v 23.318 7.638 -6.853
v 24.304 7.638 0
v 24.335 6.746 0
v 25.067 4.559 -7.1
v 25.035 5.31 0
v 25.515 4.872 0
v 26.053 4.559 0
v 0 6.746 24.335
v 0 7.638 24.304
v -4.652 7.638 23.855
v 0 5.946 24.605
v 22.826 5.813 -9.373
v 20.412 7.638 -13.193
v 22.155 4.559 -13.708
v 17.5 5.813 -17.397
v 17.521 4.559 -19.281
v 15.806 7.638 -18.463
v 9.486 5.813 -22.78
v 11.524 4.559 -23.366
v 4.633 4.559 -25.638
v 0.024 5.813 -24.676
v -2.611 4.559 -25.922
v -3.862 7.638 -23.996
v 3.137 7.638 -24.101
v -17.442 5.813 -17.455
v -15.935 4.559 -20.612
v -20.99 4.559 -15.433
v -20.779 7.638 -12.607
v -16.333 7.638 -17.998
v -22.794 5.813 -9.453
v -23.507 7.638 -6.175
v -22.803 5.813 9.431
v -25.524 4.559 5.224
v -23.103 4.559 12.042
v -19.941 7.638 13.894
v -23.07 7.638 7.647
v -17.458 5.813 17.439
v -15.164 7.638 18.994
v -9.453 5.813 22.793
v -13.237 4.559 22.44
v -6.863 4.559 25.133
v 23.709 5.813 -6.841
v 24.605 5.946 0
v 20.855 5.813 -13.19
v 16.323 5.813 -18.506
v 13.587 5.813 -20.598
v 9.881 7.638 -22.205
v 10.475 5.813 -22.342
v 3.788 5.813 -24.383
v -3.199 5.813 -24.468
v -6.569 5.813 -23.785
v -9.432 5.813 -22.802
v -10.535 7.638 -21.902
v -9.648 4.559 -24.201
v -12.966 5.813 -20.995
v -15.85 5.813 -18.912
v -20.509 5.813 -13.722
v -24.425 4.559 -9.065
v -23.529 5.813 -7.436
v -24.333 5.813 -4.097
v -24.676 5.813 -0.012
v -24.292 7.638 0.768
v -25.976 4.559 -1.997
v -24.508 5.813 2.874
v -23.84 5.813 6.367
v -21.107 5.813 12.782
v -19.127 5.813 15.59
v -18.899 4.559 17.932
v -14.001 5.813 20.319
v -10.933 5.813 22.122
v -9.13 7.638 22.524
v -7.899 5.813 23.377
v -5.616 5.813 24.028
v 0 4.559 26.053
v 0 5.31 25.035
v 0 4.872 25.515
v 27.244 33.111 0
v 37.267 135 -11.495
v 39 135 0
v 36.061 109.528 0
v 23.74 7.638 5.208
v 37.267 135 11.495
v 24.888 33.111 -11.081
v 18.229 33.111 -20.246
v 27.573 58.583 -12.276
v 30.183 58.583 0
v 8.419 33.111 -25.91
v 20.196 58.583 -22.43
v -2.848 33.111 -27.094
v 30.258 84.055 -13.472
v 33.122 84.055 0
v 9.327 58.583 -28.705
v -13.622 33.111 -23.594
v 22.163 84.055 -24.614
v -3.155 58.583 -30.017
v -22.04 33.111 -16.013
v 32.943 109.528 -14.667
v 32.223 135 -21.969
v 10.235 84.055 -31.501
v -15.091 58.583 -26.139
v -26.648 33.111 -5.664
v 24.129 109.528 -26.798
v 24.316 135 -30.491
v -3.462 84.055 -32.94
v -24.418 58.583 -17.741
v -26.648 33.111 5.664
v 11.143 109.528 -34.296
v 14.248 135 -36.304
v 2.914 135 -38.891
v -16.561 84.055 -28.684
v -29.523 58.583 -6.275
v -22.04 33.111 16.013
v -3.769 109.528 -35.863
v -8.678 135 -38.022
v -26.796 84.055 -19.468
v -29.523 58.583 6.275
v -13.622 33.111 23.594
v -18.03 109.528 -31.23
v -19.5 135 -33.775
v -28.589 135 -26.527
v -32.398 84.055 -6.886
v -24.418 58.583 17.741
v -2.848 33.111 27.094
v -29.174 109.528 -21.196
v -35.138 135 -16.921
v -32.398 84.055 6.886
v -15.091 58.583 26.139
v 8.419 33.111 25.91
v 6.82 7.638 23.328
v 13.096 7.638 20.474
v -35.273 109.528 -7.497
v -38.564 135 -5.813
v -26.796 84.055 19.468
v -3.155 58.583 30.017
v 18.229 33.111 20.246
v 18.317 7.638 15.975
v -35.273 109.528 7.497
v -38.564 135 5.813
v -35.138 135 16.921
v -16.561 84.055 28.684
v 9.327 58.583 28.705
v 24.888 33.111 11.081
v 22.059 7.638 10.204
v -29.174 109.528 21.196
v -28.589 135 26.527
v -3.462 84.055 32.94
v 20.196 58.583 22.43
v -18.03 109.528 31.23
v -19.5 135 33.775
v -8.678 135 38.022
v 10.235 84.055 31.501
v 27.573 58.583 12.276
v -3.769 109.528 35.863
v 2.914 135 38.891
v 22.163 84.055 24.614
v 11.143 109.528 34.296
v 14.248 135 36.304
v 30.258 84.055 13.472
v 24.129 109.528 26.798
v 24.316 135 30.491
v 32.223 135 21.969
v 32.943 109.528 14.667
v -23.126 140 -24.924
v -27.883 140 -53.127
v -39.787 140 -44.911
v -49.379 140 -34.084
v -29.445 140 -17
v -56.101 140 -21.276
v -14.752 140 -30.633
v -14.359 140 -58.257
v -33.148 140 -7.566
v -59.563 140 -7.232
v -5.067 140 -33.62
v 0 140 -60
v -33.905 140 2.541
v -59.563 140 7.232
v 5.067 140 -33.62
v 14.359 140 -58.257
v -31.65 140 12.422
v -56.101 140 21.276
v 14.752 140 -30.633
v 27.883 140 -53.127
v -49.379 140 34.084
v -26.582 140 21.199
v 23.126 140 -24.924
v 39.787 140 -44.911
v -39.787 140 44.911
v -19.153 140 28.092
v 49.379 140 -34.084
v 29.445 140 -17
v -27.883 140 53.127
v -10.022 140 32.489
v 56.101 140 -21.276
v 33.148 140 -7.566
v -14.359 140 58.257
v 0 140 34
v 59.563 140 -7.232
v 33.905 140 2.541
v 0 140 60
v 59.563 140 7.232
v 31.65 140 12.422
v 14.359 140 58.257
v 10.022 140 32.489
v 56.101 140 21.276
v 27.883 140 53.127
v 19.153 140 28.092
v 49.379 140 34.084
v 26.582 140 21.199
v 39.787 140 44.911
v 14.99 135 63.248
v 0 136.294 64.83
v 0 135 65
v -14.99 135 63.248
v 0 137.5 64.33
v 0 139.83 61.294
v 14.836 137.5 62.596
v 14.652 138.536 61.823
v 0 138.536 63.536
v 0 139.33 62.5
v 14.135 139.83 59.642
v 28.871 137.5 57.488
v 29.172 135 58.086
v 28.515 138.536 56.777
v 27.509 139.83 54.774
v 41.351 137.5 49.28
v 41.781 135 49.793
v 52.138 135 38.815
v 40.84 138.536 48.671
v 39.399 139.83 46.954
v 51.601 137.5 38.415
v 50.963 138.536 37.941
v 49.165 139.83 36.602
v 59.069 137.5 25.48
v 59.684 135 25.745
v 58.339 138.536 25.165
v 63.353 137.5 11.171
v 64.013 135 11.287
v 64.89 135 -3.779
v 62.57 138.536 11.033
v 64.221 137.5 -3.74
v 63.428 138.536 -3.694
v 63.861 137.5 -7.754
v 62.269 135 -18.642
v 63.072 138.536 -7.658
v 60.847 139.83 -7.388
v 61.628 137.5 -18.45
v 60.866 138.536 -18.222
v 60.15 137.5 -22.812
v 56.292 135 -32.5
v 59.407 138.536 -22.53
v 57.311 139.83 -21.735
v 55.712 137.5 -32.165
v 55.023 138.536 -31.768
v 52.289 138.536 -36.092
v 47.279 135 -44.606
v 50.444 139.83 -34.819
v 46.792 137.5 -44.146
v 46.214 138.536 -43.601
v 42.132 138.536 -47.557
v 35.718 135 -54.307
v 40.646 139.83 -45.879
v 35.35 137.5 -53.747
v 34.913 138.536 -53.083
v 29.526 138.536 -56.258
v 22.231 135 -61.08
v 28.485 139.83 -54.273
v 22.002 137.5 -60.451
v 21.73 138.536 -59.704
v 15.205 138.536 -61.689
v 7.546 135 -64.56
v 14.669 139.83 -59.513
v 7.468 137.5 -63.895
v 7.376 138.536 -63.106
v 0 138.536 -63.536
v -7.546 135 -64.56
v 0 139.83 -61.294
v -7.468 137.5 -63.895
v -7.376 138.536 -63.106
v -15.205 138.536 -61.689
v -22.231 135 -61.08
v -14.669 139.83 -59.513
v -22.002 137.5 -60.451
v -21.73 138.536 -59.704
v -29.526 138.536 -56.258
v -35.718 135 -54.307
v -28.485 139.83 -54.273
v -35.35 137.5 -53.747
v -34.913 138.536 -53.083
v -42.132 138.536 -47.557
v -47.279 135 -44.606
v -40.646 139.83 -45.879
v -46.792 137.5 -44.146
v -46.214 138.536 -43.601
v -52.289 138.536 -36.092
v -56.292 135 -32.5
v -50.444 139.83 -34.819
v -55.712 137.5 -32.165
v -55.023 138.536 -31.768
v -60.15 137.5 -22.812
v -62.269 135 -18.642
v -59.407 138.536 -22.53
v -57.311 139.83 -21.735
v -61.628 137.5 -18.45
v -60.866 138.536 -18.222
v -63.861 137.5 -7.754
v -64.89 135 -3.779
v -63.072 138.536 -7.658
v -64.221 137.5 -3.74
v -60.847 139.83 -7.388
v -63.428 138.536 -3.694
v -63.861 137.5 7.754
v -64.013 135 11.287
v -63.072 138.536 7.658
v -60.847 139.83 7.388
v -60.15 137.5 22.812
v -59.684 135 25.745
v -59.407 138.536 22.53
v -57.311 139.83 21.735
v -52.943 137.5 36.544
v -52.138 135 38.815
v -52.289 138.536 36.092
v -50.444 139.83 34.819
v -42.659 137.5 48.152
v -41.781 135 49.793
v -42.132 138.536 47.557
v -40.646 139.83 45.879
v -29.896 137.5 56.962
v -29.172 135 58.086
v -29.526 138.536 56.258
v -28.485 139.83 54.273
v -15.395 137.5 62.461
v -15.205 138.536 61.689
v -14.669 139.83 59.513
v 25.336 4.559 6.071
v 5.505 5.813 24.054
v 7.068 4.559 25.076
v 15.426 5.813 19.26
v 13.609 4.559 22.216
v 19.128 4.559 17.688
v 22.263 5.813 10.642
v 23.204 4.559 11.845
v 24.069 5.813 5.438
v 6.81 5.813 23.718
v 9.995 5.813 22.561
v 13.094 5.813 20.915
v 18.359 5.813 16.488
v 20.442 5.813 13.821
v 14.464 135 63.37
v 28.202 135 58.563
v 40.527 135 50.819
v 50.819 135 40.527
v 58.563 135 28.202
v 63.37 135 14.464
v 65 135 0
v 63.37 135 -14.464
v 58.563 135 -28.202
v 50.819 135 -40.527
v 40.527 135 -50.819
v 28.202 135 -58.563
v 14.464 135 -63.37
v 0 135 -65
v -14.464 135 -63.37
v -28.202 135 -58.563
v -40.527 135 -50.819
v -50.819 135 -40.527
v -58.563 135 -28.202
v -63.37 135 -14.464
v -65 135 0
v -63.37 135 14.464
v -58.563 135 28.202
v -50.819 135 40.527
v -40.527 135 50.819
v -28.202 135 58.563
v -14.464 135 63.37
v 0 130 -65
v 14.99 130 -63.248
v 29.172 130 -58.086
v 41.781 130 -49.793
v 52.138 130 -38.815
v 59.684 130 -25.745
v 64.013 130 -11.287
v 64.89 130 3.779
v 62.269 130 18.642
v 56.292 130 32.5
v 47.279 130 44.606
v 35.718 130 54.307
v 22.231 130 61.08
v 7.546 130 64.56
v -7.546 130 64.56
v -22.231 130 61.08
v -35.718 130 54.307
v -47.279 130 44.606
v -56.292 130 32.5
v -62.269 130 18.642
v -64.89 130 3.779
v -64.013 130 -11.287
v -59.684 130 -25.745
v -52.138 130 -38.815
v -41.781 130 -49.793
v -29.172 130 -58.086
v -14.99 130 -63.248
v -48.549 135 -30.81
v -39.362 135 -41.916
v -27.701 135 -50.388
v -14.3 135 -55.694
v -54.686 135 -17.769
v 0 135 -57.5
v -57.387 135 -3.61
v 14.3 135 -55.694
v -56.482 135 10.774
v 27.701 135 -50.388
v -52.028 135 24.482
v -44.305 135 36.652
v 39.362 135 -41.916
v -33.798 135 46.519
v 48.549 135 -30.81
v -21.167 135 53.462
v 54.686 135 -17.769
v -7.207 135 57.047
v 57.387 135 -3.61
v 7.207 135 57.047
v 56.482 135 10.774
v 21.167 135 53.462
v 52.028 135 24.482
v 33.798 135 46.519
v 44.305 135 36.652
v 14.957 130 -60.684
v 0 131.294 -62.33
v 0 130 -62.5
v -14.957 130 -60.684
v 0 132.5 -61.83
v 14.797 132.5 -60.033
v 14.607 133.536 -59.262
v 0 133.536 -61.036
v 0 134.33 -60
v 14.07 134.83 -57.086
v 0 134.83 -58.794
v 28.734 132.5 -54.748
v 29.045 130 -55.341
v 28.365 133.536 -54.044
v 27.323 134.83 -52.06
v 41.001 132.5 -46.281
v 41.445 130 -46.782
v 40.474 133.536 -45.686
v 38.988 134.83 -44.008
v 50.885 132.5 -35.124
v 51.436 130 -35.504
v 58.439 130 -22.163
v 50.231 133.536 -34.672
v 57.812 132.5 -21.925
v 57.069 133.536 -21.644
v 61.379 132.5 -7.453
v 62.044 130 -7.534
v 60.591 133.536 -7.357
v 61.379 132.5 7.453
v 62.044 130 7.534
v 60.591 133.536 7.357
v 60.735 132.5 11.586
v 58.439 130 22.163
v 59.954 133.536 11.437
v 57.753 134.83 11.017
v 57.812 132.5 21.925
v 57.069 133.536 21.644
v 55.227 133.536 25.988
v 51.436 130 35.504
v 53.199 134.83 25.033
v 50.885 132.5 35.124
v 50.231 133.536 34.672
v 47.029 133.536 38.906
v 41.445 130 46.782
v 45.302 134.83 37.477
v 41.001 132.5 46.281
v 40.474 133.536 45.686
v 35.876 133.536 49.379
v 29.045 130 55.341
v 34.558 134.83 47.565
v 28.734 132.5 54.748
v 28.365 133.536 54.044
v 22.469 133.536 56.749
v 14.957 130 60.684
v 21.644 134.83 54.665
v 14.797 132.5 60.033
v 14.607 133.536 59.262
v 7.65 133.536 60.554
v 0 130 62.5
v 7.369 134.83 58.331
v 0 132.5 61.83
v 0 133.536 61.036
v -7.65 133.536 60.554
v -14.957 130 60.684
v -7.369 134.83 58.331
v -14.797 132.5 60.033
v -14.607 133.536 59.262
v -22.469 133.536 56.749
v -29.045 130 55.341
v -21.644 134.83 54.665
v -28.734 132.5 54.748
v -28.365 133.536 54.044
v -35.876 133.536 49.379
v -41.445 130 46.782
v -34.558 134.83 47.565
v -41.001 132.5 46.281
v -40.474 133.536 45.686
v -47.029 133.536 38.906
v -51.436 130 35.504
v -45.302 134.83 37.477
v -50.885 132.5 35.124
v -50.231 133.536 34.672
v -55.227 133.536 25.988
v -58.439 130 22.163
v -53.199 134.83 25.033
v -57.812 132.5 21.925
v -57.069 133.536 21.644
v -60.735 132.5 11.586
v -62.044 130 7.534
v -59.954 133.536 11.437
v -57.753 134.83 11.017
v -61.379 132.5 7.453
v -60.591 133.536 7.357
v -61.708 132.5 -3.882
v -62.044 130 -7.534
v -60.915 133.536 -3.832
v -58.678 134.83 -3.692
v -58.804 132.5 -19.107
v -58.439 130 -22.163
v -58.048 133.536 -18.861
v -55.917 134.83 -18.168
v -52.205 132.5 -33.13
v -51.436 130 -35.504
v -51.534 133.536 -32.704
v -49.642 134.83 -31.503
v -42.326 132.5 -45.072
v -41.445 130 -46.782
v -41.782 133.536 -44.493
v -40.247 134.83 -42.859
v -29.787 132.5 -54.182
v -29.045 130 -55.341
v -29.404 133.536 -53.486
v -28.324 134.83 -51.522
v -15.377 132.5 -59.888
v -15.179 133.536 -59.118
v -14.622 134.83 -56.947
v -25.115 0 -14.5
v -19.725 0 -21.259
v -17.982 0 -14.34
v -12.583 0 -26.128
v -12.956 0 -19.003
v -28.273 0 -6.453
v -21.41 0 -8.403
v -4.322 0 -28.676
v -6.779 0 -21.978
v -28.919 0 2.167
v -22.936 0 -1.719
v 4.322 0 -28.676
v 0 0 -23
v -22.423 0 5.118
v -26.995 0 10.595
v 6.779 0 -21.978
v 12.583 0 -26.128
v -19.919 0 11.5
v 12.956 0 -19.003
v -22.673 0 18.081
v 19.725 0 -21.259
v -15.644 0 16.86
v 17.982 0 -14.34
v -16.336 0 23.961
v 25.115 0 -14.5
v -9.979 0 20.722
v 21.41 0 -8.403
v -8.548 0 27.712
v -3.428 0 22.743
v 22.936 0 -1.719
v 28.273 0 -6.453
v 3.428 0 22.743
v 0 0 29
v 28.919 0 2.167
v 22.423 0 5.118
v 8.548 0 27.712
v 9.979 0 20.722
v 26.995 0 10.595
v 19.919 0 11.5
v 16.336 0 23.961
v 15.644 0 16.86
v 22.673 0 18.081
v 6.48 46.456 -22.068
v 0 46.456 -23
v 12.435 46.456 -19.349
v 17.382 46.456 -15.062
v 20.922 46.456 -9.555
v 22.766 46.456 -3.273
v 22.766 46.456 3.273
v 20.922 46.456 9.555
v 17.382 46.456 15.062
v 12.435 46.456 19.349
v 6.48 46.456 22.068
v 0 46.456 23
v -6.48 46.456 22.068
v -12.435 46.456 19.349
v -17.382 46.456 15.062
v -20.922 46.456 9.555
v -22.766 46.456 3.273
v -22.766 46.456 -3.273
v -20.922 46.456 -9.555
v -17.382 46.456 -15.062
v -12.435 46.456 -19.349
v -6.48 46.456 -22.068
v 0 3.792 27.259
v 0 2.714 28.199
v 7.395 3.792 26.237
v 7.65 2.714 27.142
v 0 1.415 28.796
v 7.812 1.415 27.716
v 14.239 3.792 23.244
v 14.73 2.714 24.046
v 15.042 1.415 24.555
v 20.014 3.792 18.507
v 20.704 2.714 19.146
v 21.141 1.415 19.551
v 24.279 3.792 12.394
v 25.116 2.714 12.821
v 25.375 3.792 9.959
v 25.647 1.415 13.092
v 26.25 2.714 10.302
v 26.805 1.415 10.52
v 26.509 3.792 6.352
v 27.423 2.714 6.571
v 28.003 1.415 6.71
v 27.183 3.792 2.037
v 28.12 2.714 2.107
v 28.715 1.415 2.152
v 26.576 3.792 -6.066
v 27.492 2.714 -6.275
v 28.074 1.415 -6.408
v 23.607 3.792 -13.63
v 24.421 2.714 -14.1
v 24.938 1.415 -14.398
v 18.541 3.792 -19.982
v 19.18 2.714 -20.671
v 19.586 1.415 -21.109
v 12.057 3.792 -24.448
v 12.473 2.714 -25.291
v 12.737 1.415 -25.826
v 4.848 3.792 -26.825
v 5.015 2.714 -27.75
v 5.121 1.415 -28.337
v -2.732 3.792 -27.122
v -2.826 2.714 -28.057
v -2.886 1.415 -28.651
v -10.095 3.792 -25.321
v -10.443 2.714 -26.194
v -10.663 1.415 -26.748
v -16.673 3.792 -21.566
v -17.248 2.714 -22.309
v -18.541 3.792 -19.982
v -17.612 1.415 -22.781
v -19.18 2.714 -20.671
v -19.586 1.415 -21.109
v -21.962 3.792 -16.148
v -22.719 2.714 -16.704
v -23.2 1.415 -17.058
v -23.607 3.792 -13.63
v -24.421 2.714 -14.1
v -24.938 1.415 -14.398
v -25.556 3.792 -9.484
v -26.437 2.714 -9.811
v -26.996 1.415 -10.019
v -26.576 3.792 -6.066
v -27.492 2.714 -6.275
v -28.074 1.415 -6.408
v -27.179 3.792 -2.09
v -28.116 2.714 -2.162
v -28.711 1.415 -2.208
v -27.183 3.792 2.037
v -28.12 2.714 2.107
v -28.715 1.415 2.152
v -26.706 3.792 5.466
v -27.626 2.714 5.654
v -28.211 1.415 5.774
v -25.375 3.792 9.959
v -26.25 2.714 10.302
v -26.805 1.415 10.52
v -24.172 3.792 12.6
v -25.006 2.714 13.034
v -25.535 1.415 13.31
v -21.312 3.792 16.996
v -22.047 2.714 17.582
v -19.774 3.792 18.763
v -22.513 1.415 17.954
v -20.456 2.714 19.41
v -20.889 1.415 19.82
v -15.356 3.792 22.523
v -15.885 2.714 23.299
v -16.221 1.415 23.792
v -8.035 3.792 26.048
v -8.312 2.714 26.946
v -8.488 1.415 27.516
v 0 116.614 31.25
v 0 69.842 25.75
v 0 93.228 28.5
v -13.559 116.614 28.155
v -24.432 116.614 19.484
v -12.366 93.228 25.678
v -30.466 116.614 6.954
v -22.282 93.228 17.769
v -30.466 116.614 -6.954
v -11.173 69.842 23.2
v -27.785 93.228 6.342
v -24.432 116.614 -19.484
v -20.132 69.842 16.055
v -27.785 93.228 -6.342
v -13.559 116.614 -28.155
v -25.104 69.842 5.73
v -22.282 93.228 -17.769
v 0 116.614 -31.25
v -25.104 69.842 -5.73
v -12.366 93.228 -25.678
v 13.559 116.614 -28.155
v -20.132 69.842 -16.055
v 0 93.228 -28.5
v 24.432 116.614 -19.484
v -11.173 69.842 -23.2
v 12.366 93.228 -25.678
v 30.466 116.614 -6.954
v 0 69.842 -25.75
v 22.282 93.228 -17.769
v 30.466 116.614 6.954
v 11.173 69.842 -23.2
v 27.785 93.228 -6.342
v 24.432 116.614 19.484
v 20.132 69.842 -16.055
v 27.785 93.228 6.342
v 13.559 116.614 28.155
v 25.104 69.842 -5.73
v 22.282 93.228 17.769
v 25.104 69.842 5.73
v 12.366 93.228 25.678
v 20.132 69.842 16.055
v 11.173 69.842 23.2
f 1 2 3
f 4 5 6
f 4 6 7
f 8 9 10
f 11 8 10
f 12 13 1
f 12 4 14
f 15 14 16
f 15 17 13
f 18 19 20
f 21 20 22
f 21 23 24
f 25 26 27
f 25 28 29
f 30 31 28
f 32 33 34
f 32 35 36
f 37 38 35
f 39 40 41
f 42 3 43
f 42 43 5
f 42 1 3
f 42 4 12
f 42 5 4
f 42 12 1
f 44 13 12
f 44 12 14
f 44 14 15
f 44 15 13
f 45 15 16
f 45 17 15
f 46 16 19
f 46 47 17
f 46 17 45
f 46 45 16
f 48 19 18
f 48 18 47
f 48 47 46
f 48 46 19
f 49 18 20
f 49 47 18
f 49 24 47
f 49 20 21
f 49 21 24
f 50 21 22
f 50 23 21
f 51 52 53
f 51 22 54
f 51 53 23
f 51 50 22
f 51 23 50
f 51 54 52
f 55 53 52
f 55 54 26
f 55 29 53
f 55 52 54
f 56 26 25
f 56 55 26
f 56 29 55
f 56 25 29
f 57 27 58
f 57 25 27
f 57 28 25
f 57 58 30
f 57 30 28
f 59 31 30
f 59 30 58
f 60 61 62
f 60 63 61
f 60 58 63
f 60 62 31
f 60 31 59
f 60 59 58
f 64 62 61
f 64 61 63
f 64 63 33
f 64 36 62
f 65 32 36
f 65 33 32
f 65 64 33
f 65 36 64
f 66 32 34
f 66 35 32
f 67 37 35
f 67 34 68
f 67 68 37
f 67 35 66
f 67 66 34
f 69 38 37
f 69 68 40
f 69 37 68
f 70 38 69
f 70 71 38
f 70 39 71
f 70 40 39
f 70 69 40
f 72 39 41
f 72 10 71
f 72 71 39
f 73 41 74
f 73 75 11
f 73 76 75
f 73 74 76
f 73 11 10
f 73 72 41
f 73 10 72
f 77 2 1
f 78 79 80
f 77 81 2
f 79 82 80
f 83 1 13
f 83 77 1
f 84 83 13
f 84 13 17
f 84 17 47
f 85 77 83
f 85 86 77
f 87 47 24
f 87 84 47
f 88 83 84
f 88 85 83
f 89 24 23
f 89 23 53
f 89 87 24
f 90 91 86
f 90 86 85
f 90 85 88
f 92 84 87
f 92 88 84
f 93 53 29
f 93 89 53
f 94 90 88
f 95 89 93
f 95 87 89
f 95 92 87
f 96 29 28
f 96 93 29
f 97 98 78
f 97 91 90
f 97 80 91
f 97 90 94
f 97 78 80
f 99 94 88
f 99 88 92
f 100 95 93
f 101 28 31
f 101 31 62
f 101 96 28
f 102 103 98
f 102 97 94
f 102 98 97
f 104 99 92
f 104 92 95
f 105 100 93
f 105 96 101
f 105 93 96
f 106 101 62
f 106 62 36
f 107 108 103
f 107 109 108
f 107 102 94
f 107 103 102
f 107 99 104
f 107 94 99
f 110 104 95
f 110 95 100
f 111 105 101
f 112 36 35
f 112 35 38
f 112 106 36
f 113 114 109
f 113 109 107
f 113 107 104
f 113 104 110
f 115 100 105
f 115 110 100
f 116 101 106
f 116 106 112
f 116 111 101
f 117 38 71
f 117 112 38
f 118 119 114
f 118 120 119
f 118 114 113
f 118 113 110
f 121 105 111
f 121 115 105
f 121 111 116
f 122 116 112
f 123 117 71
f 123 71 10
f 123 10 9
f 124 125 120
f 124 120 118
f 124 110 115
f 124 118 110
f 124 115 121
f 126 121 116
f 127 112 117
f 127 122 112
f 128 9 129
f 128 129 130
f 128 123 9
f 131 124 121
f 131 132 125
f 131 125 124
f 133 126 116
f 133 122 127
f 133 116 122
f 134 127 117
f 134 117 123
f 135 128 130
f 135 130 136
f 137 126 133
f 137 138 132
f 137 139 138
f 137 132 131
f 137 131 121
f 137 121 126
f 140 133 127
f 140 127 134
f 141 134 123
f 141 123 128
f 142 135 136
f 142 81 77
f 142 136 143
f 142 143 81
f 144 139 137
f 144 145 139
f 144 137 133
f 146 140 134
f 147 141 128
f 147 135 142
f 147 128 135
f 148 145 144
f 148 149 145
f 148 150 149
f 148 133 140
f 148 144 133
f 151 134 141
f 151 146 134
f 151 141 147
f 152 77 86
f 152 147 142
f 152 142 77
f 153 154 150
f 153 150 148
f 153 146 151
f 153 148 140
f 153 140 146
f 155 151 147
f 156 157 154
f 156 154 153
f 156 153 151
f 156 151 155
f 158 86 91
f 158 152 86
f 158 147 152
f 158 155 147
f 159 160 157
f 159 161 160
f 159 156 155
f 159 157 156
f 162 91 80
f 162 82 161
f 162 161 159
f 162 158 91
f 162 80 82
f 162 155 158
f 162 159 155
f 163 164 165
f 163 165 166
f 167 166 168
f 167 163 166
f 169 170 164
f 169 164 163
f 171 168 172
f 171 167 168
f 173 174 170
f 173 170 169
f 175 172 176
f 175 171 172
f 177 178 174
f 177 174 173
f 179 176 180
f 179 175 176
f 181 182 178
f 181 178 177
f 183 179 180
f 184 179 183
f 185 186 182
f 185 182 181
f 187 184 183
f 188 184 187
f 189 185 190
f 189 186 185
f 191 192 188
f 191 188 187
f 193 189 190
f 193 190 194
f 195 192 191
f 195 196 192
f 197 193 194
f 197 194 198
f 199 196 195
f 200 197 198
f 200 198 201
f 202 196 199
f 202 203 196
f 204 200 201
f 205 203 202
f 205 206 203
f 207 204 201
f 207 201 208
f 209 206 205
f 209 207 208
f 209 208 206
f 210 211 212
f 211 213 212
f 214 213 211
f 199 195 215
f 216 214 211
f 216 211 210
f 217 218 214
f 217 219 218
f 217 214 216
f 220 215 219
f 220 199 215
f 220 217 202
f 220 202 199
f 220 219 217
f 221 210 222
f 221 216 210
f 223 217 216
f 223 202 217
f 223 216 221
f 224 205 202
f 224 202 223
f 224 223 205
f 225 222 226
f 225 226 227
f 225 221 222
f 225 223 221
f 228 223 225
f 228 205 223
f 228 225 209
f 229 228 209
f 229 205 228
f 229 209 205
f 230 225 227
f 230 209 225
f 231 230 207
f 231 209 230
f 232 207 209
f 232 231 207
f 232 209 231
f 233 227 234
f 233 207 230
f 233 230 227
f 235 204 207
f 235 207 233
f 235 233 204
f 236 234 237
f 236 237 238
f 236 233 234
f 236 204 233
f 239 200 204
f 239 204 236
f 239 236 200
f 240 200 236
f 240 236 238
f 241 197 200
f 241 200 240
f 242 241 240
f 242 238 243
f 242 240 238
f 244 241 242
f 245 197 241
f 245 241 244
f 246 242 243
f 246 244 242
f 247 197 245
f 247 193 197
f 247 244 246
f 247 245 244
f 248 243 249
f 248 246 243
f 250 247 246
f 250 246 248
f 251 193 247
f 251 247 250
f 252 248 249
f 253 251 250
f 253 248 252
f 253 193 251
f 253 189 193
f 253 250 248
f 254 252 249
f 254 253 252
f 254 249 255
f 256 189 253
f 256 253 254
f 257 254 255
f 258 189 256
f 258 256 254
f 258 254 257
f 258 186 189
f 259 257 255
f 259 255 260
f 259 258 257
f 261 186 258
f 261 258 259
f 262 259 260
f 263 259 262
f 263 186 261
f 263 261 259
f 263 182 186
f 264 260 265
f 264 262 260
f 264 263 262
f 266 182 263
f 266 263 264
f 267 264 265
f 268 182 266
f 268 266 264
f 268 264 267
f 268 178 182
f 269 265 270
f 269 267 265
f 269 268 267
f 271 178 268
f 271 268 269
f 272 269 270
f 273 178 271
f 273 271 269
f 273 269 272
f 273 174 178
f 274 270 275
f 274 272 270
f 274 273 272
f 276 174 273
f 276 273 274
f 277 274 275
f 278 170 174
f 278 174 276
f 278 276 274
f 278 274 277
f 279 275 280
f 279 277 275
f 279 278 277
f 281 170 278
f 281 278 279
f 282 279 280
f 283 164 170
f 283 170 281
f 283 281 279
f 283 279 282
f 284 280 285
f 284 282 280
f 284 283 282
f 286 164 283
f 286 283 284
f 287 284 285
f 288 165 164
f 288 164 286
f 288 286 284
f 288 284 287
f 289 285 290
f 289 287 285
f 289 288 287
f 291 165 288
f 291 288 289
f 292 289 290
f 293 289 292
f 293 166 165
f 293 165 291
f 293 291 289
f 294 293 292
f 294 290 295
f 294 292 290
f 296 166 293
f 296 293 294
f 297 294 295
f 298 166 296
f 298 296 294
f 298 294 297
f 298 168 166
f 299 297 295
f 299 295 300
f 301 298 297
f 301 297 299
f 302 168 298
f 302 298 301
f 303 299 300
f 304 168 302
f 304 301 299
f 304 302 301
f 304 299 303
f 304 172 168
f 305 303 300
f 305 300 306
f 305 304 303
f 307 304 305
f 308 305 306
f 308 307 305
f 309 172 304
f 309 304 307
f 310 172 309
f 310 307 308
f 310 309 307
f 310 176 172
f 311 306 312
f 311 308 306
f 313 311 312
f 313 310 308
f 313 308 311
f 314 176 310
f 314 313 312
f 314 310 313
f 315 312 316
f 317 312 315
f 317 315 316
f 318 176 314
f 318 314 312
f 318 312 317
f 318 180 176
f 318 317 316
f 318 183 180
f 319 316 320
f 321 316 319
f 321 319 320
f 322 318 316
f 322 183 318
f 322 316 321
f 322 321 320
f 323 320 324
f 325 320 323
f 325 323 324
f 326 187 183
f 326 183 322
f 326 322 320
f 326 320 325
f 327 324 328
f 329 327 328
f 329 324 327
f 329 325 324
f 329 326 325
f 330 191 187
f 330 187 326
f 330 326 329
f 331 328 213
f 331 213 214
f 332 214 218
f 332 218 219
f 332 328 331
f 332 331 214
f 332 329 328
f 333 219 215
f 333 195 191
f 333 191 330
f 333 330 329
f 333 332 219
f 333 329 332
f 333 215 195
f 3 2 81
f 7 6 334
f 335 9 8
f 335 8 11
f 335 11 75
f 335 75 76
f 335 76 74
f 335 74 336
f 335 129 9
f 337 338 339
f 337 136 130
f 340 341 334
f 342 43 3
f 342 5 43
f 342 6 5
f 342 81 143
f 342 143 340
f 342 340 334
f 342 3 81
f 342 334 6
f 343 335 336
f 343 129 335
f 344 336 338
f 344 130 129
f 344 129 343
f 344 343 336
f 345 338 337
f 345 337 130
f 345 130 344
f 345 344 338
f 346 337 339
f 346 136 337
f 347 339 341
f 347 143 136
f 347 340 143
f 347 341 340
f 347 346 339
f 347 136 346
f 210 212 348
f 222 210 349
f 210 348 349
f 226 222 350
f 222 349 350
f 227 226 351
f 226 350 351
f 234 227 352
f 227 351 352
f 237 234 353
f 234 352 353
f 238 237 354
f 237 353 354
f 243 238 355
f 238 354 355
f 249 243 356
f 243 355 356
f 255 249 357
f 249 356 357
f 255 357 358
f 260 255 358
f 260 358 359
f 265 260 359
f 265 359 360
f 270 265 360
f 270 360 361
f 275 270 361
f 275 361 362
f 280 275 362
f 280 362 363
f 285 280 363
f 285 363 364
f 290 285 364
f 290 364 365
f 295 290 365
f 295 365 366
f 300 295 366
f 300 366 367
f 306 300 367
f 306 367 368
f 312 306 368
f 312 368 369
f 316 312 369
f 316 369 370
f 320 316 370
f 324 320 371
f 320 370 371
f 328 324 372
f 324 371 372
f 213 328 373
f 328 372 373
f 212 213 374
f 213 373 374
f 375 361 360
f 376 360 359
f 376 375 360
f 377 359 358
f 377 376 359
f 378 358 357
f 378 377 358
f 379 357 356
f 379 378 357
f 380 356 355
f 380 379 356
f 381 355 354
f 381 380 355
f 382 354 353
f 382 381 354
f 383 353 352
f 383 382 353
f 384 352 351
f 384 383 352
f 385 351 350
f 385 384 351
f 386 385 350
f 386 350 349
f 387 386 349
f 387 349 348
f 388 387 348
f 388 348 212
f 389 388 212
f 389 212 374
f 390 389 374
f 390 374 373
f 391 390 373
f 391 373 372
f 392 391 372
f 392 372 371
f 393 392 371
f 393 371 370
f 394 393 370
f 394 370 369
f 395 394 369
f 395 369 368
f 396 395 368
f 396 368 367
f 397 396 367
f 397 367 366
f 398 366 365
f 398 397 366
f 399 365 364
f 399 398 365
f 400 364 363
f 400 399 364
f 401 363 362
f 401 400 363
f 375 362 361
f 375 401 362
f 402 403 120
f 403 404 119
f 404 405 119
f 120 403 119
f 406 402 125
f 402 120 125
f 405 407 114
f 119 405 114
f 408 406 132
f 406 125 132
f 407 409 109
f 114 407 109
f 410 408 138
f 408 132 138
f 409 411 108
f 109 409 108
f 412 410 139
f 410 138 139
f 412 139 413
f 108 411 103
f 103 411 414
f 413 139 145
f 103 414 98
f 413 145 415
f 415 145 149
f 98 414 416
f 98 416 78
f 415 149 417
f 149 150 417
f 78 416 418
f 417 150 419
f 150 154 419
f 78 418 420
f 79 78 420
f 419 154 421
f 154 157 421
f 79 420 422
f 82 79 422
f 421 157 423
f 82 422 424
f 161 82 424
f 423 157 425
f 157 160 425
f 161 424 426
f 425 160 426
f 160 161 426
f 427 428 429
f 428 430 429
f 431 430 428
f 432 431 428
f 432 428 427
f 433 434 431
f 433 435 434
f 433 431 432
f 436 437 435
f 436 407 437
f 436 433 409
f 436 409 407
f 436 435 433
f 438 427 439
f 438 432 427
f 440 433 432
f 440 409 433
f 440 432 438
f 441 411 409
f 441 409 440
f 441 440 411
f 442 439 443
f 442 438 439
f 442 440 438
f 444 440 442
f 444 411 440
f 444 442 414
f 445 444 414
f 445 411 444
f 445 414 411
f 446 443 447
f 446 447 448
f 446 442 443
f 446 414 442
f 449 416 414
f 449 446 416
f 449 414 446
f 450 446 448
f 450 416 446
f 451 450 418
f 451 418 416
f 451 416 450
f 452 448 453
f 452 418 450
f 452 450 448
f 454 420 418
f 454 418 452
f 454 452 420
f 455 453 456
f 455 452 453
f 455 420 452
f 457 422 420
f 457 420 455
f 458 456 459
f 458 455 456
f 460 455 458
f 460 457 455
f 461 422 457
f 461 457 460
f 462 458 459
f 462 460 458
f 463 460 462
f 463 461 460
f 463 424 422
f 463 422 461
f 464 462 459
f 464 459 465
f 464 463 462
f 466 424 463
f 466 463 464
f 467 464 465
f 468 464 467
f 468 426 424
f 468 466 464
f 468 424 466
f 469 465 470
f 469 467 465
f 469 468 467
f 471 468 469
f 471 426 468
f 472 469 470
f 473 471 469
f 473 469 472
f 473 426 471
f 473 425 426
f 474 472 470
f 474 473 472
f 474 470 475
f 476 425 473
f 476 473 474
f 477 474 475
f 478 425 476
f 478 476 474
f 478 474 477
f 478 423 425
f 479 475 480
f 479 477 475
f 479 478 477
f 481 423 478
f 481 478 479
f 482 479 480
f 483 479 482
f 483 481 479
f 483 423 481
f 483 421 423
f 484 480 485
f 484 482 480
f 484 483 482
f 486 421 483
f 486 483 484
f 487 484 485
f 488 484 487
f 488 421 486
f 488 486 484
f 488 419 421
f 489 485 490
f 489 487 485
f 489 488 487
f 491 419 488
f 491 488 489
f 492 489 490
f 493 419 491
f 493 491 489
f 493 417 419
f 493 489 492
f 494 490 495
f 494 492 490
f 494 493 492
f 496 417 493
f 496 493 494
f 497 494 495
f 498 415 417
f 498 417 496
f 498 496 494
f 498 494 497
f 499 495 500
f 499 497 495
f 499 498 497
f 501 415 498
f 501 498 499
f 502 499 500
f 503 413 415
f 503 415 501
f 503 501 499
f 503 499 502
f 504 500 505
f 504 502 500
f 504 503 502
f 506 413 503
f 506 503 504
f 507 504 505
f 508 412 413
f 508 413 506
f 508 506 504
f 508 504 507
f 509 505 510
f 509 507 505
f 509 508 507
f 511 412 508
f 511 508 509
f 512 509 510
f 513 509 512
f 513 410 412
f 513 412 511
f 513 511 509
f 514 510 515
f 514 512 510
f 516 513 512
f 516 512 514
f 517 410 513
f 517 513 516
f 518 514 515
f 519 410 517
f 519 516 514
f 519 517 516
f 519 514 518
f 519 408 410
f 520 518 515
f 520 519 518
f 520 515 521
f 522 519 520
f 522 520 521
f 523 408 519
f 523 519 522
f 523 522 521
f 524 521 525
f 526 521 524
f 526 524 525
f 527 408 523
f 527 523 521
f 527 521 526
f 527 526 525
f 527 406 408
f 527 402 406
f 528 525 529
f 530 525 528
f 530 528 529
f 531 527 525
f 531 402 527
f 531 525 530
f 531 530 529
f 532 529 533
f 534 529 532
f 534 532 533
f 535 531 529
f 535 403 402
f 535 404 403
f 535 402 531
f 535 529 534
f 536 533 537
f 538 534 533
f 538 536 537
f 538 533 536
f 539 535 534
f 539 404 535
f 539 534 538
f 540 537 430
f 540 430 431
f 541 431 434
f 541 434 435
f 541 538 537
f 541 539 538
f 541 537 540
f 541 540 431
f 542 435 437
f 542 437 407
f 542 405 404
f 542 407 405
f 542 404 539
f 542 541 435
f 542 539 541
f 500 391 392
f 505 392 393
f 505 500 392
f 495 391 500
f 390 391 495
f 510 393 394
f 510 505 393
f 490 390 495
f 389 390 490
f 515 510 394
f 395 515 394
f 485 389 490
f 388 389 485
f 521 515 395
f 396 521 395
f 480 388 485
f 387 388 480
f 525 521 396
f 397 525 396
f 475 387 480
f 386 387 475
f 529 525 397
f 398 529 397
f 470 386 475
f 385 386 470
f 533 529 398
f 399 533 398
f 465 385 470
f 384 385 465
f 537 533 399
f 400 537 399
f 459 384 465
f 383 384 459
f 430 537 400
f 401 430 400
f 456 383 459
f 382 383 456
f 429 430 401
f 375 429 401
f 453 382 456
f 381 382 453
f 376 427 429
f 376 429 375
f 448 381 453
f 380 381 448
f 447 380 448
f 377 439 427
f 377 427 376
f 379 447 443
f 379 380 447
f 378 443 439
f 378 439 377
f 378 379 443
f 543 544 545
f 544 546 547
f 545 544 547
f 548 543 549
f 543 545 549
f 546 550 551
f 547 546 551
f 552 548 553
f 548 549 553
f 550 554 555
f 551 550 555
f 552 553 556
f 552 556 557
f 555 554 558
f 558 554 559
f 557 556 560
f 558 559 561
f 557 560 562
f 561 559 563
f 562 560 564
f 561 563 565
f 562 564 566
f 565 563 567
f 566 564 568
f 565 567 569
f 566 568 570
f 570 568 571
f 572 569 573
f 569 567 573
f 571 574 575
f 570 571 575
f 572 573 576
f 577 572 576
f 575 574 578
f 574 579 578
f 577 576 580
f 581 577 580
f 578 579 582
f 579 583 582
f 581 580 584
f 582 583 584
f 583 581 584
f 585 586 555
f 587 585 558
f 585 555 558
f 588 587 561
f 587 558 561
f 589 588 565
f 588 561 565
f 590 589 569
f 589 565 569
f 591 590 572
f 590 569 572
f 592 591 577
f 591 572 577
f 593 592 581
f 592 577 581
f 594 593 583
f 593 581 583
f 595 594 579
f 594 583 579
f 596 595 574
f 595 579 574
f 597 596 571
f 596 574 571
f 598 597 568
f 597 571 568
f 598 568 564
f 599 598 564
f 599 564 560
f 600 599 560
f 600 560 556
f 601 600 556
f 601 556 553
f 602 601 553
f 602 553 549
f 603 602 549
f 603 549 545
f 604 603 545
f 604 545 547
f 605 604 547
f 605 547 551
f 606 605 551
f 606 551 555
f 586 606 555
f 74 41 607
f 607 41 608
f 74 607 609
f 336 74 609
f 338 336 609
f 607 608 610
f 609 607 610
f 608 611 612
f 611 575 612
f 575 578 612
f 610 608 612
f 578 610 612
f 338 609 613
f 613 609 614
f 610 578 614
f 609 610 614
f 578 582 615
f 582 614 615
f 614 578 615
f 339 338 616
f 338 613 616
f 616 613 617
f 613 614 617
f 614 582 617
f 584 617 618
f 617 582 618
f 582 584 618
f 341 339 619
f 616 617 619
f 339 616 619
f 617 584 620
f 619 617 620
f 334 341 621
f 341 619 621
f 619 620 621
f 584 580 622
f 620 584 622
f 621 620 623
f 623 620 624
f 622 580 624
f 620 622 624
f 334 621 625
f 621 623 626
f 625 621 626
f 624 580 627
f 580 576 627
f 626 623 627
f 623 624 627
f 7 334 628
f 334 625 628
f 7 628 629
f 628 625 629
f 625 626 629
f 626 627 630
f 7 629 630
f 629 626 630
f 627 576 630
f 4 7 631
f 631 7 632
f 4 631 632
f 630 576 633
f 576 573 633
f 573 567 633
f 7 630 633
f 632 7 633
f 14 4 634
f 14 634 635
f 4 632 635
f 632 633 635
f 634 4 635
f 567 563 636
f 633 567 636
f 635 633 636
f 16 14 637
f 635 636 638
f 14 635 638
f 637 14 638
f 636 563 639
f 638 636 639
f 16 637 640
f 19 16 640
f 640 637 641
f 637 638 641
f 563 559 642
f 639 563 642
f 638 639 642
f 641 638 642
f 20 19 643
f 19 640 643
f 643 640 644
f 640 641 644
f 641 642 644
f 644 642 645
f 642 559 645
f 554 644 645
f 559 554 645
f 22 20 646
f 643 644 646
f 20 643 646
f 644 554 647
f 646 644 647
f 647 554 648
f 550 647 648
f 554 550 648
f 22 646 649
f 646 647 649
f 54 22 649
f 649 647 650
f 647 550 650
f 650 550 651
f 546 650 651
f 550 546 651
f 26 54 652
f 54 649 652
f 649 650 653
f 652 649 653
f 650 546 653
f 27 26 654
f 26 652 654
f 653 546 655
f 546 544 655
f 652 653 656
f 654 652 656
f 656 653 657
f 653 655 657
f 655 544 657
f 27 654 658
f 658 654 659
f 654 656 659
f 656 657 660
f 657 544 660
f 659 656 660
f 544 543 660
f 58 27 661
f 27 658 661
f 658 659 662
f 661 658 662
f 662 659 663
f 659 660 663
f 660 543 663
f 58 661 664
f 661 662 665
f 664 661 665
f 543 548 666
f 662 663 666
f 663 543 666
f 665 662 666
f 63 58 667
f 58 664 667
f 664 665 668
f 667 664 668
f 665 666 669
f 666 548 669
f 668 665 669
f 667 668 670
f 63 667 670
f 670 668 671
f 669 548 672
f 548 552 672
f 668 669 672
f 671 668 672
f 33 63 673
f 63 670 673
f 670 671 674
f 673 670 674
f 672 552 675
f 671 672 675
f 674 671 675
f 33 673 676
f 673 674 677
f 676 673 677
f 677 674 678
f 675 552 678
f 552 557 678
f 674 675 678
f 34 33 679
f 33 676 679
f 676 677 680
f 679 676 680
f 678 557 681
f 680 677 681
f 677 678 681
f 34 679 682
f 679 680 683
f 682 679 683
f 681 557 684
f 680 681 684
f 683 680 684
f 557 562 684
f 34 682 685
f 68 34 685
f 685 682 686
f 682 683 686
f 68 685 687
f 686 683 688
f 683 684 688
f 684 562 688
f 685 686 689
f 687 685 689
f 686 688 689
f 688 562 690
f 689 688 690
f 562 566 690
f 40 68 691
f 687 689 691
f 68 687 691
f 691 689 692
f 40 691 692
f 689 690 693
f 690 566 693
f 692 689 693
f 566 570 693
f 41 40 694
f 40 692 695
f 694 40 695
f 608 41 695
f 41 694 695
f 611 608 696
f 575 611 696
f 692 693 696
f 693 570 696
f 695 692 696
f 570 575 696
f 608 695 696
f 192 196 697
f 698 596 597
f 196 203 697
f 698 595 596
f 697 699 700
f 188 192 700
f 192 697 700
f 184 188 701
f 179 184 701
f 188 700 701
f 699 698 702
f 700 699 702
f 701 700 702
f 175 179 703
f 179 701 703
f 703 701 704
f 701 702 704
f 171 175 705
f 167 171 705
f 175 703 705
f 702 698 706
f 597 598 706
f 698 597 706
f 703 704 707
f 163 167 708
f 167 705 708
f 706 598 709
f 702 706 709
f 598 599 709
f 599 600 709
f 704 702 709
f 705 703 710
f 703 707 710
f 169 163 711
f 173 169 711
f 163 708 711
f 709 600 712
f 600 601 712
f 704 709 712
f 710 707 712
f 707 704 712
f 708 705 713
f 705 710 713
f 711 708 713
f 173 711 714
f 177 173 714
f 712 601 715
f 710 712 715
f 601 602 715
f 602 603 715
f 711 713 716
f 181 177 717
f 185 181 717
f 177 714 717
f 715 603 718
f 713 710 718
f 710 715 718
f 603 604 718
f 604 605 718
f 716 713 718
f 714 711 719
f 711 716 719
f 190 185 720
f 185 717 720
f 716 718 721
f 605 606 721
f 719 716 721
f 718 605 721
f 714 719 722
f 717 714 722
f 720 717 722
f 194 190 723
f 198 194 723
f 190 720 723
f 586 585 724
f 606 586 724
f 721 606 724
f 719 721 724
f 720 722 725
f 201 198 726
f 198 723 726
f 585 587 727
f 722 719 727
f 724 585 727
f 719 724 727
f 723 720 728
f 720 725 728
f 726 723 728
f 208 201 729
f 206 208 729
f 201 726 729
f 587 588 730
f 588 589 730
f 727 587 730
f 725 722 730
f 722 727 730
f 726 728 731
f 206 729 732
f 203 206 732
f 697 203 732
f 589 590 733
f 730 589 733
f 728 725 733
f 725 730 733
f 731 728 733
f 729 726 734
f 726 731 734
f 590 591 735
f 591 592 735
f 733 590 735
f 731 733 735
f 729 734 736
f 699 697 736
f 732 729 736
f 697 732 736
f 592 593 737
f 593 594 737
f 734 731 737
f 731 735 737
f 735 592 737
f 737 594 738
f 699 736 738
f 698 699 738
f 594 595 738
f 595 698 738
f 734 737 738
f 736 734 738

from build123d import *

# Parameters (mm, degrees)
CROQUIS1_R              = 29
SALIENTE_EXTRUIR1_DEPTH = 5
CROQUIS2_R              = 24
CROQUIS3_R              = 39
CROQUIS4_R              = 65
SALIENTE_EXTRUIR2_DEPTH = 5
SALIENTE_EXTRUIR3_START = 5
CROQUIS5_R              = 65
CROQUIS5_R_2            = 62.5
SALIENTE_EXTRUIR3_DEPTH = 5
REDONDEO1_R             = 5
CROQUIS6_R              = 23
CORTAR_EXTRUIR1_DEPTH   = 62
REDONDEO2_R             = 3


with BuildPart() as part:
    # Croquis1 → Saliente-Extruir1 (new body)
    with BuildSketch(Plane(origin=(0, 0, 0), x_dir=(1, 0, 0), z_dir=(0, 1, 0))):
        with Locations(Location((0, 0, 0), (0, 0, 270))):
            Circle(CROQUIS1_R)
    extrude(amount=SALIENTE_EXTRUIR1_DEPTH)

    # Croquis2 → Recubrir1 section 0
    with BuildSketch(Plane(origin=(0, 5, 0), x_dir=(1, 0, 0), z_dir=(0, 1, 0))):
        Circle(CROQUIS2_R)
    # Croquis3 → Recubrir1 section 1
    with BuildSketch(Plane(origin=(0, 135, 0), x_dir=(1, 0, 0), z_dir=(0, 1, 0))):
        Circle(CROQUIS3_R)
    loft()

    # Croquis4 → Saliente-Extruir2 (add)
    with BuildSketch(Plane(origin=(0, 135, 0), x_dir=(1, 0, 0), z_dir=(0, 1, 0))):
        with Locations(Location((0, 0, 0), (0, 0, 270))):
            Circle(CROQUIS4_R)
    extrude(amount=SALIENTE_EXTRUIR2_DEPTH)

    # Croquis5 → Saliente-Extruir3 (add)
    with BuildSketch(Plane.XZ.offset(-135).offset(SALIENTE_EXTRUIR3_START)):
        with Locations(Location((0, 0, 0), (0, 0, 270))):
            Circle(CROQUIS5_R)
        with Locations(Location((0, 0, 0), (0, 0, 270))):
            Circle(CROQUIS5_R_2, mode=Mode.SUBTRACT)
    extrude(amount=-SALIENTE_EXTRUIR3_DEPTH)

    # Redondeo1
    redondeo1_edges = [part.edges().sort_by_distance(p)[0] for p in [
        (0, 140, -65),
        (0, 135, 62.5),
        (0, 5, -29),
    ]]
    fillet(redondeo1_edges, radius=REDONDEO1_R - 0.0001)  # a hair under: the kernel refuses the full size

    # Croquis6 → Cortar-Extruir1 (cut)
    with BuildSketch(Plane.XZ):
        with Locations(Location((0, 0, 0), (0, 0, 270))):
            Circle(CROQUIS6_R)
    extrude(amount=-CORTAR_EXTRUIR1_DEPTH, mode=Mode.SUBTRACT)

    # Croquis7 → Cortar-Revolución1 (revolve, cut)
    with BuildSketch(Plane.XY, mode=Mode.PRIVATE) as cortar_revoluci_n1_sk:
        Polygon((22, 37.952055194), (0, 37.952055194), (0, 140), (34, 140), align=None)
    revolve(cortar_revoluci_n1_sk.sketch.rotate(Axis((0, 192.821641375, 0), (0, -1, 0)), 90), axis=Axis((0, 192.821641375, 0), (0, -1, 0)), mode=Mode.SUBTRACT)

    # Redondeo2
    redondeo2_edges = [part.edges().sort_by_distance(p)[0] for p in [
        (-24, 5, 0),
    ]]
    fillet(redondeo2_edges, radius=REDONDEO2_R)


solid = part.part
